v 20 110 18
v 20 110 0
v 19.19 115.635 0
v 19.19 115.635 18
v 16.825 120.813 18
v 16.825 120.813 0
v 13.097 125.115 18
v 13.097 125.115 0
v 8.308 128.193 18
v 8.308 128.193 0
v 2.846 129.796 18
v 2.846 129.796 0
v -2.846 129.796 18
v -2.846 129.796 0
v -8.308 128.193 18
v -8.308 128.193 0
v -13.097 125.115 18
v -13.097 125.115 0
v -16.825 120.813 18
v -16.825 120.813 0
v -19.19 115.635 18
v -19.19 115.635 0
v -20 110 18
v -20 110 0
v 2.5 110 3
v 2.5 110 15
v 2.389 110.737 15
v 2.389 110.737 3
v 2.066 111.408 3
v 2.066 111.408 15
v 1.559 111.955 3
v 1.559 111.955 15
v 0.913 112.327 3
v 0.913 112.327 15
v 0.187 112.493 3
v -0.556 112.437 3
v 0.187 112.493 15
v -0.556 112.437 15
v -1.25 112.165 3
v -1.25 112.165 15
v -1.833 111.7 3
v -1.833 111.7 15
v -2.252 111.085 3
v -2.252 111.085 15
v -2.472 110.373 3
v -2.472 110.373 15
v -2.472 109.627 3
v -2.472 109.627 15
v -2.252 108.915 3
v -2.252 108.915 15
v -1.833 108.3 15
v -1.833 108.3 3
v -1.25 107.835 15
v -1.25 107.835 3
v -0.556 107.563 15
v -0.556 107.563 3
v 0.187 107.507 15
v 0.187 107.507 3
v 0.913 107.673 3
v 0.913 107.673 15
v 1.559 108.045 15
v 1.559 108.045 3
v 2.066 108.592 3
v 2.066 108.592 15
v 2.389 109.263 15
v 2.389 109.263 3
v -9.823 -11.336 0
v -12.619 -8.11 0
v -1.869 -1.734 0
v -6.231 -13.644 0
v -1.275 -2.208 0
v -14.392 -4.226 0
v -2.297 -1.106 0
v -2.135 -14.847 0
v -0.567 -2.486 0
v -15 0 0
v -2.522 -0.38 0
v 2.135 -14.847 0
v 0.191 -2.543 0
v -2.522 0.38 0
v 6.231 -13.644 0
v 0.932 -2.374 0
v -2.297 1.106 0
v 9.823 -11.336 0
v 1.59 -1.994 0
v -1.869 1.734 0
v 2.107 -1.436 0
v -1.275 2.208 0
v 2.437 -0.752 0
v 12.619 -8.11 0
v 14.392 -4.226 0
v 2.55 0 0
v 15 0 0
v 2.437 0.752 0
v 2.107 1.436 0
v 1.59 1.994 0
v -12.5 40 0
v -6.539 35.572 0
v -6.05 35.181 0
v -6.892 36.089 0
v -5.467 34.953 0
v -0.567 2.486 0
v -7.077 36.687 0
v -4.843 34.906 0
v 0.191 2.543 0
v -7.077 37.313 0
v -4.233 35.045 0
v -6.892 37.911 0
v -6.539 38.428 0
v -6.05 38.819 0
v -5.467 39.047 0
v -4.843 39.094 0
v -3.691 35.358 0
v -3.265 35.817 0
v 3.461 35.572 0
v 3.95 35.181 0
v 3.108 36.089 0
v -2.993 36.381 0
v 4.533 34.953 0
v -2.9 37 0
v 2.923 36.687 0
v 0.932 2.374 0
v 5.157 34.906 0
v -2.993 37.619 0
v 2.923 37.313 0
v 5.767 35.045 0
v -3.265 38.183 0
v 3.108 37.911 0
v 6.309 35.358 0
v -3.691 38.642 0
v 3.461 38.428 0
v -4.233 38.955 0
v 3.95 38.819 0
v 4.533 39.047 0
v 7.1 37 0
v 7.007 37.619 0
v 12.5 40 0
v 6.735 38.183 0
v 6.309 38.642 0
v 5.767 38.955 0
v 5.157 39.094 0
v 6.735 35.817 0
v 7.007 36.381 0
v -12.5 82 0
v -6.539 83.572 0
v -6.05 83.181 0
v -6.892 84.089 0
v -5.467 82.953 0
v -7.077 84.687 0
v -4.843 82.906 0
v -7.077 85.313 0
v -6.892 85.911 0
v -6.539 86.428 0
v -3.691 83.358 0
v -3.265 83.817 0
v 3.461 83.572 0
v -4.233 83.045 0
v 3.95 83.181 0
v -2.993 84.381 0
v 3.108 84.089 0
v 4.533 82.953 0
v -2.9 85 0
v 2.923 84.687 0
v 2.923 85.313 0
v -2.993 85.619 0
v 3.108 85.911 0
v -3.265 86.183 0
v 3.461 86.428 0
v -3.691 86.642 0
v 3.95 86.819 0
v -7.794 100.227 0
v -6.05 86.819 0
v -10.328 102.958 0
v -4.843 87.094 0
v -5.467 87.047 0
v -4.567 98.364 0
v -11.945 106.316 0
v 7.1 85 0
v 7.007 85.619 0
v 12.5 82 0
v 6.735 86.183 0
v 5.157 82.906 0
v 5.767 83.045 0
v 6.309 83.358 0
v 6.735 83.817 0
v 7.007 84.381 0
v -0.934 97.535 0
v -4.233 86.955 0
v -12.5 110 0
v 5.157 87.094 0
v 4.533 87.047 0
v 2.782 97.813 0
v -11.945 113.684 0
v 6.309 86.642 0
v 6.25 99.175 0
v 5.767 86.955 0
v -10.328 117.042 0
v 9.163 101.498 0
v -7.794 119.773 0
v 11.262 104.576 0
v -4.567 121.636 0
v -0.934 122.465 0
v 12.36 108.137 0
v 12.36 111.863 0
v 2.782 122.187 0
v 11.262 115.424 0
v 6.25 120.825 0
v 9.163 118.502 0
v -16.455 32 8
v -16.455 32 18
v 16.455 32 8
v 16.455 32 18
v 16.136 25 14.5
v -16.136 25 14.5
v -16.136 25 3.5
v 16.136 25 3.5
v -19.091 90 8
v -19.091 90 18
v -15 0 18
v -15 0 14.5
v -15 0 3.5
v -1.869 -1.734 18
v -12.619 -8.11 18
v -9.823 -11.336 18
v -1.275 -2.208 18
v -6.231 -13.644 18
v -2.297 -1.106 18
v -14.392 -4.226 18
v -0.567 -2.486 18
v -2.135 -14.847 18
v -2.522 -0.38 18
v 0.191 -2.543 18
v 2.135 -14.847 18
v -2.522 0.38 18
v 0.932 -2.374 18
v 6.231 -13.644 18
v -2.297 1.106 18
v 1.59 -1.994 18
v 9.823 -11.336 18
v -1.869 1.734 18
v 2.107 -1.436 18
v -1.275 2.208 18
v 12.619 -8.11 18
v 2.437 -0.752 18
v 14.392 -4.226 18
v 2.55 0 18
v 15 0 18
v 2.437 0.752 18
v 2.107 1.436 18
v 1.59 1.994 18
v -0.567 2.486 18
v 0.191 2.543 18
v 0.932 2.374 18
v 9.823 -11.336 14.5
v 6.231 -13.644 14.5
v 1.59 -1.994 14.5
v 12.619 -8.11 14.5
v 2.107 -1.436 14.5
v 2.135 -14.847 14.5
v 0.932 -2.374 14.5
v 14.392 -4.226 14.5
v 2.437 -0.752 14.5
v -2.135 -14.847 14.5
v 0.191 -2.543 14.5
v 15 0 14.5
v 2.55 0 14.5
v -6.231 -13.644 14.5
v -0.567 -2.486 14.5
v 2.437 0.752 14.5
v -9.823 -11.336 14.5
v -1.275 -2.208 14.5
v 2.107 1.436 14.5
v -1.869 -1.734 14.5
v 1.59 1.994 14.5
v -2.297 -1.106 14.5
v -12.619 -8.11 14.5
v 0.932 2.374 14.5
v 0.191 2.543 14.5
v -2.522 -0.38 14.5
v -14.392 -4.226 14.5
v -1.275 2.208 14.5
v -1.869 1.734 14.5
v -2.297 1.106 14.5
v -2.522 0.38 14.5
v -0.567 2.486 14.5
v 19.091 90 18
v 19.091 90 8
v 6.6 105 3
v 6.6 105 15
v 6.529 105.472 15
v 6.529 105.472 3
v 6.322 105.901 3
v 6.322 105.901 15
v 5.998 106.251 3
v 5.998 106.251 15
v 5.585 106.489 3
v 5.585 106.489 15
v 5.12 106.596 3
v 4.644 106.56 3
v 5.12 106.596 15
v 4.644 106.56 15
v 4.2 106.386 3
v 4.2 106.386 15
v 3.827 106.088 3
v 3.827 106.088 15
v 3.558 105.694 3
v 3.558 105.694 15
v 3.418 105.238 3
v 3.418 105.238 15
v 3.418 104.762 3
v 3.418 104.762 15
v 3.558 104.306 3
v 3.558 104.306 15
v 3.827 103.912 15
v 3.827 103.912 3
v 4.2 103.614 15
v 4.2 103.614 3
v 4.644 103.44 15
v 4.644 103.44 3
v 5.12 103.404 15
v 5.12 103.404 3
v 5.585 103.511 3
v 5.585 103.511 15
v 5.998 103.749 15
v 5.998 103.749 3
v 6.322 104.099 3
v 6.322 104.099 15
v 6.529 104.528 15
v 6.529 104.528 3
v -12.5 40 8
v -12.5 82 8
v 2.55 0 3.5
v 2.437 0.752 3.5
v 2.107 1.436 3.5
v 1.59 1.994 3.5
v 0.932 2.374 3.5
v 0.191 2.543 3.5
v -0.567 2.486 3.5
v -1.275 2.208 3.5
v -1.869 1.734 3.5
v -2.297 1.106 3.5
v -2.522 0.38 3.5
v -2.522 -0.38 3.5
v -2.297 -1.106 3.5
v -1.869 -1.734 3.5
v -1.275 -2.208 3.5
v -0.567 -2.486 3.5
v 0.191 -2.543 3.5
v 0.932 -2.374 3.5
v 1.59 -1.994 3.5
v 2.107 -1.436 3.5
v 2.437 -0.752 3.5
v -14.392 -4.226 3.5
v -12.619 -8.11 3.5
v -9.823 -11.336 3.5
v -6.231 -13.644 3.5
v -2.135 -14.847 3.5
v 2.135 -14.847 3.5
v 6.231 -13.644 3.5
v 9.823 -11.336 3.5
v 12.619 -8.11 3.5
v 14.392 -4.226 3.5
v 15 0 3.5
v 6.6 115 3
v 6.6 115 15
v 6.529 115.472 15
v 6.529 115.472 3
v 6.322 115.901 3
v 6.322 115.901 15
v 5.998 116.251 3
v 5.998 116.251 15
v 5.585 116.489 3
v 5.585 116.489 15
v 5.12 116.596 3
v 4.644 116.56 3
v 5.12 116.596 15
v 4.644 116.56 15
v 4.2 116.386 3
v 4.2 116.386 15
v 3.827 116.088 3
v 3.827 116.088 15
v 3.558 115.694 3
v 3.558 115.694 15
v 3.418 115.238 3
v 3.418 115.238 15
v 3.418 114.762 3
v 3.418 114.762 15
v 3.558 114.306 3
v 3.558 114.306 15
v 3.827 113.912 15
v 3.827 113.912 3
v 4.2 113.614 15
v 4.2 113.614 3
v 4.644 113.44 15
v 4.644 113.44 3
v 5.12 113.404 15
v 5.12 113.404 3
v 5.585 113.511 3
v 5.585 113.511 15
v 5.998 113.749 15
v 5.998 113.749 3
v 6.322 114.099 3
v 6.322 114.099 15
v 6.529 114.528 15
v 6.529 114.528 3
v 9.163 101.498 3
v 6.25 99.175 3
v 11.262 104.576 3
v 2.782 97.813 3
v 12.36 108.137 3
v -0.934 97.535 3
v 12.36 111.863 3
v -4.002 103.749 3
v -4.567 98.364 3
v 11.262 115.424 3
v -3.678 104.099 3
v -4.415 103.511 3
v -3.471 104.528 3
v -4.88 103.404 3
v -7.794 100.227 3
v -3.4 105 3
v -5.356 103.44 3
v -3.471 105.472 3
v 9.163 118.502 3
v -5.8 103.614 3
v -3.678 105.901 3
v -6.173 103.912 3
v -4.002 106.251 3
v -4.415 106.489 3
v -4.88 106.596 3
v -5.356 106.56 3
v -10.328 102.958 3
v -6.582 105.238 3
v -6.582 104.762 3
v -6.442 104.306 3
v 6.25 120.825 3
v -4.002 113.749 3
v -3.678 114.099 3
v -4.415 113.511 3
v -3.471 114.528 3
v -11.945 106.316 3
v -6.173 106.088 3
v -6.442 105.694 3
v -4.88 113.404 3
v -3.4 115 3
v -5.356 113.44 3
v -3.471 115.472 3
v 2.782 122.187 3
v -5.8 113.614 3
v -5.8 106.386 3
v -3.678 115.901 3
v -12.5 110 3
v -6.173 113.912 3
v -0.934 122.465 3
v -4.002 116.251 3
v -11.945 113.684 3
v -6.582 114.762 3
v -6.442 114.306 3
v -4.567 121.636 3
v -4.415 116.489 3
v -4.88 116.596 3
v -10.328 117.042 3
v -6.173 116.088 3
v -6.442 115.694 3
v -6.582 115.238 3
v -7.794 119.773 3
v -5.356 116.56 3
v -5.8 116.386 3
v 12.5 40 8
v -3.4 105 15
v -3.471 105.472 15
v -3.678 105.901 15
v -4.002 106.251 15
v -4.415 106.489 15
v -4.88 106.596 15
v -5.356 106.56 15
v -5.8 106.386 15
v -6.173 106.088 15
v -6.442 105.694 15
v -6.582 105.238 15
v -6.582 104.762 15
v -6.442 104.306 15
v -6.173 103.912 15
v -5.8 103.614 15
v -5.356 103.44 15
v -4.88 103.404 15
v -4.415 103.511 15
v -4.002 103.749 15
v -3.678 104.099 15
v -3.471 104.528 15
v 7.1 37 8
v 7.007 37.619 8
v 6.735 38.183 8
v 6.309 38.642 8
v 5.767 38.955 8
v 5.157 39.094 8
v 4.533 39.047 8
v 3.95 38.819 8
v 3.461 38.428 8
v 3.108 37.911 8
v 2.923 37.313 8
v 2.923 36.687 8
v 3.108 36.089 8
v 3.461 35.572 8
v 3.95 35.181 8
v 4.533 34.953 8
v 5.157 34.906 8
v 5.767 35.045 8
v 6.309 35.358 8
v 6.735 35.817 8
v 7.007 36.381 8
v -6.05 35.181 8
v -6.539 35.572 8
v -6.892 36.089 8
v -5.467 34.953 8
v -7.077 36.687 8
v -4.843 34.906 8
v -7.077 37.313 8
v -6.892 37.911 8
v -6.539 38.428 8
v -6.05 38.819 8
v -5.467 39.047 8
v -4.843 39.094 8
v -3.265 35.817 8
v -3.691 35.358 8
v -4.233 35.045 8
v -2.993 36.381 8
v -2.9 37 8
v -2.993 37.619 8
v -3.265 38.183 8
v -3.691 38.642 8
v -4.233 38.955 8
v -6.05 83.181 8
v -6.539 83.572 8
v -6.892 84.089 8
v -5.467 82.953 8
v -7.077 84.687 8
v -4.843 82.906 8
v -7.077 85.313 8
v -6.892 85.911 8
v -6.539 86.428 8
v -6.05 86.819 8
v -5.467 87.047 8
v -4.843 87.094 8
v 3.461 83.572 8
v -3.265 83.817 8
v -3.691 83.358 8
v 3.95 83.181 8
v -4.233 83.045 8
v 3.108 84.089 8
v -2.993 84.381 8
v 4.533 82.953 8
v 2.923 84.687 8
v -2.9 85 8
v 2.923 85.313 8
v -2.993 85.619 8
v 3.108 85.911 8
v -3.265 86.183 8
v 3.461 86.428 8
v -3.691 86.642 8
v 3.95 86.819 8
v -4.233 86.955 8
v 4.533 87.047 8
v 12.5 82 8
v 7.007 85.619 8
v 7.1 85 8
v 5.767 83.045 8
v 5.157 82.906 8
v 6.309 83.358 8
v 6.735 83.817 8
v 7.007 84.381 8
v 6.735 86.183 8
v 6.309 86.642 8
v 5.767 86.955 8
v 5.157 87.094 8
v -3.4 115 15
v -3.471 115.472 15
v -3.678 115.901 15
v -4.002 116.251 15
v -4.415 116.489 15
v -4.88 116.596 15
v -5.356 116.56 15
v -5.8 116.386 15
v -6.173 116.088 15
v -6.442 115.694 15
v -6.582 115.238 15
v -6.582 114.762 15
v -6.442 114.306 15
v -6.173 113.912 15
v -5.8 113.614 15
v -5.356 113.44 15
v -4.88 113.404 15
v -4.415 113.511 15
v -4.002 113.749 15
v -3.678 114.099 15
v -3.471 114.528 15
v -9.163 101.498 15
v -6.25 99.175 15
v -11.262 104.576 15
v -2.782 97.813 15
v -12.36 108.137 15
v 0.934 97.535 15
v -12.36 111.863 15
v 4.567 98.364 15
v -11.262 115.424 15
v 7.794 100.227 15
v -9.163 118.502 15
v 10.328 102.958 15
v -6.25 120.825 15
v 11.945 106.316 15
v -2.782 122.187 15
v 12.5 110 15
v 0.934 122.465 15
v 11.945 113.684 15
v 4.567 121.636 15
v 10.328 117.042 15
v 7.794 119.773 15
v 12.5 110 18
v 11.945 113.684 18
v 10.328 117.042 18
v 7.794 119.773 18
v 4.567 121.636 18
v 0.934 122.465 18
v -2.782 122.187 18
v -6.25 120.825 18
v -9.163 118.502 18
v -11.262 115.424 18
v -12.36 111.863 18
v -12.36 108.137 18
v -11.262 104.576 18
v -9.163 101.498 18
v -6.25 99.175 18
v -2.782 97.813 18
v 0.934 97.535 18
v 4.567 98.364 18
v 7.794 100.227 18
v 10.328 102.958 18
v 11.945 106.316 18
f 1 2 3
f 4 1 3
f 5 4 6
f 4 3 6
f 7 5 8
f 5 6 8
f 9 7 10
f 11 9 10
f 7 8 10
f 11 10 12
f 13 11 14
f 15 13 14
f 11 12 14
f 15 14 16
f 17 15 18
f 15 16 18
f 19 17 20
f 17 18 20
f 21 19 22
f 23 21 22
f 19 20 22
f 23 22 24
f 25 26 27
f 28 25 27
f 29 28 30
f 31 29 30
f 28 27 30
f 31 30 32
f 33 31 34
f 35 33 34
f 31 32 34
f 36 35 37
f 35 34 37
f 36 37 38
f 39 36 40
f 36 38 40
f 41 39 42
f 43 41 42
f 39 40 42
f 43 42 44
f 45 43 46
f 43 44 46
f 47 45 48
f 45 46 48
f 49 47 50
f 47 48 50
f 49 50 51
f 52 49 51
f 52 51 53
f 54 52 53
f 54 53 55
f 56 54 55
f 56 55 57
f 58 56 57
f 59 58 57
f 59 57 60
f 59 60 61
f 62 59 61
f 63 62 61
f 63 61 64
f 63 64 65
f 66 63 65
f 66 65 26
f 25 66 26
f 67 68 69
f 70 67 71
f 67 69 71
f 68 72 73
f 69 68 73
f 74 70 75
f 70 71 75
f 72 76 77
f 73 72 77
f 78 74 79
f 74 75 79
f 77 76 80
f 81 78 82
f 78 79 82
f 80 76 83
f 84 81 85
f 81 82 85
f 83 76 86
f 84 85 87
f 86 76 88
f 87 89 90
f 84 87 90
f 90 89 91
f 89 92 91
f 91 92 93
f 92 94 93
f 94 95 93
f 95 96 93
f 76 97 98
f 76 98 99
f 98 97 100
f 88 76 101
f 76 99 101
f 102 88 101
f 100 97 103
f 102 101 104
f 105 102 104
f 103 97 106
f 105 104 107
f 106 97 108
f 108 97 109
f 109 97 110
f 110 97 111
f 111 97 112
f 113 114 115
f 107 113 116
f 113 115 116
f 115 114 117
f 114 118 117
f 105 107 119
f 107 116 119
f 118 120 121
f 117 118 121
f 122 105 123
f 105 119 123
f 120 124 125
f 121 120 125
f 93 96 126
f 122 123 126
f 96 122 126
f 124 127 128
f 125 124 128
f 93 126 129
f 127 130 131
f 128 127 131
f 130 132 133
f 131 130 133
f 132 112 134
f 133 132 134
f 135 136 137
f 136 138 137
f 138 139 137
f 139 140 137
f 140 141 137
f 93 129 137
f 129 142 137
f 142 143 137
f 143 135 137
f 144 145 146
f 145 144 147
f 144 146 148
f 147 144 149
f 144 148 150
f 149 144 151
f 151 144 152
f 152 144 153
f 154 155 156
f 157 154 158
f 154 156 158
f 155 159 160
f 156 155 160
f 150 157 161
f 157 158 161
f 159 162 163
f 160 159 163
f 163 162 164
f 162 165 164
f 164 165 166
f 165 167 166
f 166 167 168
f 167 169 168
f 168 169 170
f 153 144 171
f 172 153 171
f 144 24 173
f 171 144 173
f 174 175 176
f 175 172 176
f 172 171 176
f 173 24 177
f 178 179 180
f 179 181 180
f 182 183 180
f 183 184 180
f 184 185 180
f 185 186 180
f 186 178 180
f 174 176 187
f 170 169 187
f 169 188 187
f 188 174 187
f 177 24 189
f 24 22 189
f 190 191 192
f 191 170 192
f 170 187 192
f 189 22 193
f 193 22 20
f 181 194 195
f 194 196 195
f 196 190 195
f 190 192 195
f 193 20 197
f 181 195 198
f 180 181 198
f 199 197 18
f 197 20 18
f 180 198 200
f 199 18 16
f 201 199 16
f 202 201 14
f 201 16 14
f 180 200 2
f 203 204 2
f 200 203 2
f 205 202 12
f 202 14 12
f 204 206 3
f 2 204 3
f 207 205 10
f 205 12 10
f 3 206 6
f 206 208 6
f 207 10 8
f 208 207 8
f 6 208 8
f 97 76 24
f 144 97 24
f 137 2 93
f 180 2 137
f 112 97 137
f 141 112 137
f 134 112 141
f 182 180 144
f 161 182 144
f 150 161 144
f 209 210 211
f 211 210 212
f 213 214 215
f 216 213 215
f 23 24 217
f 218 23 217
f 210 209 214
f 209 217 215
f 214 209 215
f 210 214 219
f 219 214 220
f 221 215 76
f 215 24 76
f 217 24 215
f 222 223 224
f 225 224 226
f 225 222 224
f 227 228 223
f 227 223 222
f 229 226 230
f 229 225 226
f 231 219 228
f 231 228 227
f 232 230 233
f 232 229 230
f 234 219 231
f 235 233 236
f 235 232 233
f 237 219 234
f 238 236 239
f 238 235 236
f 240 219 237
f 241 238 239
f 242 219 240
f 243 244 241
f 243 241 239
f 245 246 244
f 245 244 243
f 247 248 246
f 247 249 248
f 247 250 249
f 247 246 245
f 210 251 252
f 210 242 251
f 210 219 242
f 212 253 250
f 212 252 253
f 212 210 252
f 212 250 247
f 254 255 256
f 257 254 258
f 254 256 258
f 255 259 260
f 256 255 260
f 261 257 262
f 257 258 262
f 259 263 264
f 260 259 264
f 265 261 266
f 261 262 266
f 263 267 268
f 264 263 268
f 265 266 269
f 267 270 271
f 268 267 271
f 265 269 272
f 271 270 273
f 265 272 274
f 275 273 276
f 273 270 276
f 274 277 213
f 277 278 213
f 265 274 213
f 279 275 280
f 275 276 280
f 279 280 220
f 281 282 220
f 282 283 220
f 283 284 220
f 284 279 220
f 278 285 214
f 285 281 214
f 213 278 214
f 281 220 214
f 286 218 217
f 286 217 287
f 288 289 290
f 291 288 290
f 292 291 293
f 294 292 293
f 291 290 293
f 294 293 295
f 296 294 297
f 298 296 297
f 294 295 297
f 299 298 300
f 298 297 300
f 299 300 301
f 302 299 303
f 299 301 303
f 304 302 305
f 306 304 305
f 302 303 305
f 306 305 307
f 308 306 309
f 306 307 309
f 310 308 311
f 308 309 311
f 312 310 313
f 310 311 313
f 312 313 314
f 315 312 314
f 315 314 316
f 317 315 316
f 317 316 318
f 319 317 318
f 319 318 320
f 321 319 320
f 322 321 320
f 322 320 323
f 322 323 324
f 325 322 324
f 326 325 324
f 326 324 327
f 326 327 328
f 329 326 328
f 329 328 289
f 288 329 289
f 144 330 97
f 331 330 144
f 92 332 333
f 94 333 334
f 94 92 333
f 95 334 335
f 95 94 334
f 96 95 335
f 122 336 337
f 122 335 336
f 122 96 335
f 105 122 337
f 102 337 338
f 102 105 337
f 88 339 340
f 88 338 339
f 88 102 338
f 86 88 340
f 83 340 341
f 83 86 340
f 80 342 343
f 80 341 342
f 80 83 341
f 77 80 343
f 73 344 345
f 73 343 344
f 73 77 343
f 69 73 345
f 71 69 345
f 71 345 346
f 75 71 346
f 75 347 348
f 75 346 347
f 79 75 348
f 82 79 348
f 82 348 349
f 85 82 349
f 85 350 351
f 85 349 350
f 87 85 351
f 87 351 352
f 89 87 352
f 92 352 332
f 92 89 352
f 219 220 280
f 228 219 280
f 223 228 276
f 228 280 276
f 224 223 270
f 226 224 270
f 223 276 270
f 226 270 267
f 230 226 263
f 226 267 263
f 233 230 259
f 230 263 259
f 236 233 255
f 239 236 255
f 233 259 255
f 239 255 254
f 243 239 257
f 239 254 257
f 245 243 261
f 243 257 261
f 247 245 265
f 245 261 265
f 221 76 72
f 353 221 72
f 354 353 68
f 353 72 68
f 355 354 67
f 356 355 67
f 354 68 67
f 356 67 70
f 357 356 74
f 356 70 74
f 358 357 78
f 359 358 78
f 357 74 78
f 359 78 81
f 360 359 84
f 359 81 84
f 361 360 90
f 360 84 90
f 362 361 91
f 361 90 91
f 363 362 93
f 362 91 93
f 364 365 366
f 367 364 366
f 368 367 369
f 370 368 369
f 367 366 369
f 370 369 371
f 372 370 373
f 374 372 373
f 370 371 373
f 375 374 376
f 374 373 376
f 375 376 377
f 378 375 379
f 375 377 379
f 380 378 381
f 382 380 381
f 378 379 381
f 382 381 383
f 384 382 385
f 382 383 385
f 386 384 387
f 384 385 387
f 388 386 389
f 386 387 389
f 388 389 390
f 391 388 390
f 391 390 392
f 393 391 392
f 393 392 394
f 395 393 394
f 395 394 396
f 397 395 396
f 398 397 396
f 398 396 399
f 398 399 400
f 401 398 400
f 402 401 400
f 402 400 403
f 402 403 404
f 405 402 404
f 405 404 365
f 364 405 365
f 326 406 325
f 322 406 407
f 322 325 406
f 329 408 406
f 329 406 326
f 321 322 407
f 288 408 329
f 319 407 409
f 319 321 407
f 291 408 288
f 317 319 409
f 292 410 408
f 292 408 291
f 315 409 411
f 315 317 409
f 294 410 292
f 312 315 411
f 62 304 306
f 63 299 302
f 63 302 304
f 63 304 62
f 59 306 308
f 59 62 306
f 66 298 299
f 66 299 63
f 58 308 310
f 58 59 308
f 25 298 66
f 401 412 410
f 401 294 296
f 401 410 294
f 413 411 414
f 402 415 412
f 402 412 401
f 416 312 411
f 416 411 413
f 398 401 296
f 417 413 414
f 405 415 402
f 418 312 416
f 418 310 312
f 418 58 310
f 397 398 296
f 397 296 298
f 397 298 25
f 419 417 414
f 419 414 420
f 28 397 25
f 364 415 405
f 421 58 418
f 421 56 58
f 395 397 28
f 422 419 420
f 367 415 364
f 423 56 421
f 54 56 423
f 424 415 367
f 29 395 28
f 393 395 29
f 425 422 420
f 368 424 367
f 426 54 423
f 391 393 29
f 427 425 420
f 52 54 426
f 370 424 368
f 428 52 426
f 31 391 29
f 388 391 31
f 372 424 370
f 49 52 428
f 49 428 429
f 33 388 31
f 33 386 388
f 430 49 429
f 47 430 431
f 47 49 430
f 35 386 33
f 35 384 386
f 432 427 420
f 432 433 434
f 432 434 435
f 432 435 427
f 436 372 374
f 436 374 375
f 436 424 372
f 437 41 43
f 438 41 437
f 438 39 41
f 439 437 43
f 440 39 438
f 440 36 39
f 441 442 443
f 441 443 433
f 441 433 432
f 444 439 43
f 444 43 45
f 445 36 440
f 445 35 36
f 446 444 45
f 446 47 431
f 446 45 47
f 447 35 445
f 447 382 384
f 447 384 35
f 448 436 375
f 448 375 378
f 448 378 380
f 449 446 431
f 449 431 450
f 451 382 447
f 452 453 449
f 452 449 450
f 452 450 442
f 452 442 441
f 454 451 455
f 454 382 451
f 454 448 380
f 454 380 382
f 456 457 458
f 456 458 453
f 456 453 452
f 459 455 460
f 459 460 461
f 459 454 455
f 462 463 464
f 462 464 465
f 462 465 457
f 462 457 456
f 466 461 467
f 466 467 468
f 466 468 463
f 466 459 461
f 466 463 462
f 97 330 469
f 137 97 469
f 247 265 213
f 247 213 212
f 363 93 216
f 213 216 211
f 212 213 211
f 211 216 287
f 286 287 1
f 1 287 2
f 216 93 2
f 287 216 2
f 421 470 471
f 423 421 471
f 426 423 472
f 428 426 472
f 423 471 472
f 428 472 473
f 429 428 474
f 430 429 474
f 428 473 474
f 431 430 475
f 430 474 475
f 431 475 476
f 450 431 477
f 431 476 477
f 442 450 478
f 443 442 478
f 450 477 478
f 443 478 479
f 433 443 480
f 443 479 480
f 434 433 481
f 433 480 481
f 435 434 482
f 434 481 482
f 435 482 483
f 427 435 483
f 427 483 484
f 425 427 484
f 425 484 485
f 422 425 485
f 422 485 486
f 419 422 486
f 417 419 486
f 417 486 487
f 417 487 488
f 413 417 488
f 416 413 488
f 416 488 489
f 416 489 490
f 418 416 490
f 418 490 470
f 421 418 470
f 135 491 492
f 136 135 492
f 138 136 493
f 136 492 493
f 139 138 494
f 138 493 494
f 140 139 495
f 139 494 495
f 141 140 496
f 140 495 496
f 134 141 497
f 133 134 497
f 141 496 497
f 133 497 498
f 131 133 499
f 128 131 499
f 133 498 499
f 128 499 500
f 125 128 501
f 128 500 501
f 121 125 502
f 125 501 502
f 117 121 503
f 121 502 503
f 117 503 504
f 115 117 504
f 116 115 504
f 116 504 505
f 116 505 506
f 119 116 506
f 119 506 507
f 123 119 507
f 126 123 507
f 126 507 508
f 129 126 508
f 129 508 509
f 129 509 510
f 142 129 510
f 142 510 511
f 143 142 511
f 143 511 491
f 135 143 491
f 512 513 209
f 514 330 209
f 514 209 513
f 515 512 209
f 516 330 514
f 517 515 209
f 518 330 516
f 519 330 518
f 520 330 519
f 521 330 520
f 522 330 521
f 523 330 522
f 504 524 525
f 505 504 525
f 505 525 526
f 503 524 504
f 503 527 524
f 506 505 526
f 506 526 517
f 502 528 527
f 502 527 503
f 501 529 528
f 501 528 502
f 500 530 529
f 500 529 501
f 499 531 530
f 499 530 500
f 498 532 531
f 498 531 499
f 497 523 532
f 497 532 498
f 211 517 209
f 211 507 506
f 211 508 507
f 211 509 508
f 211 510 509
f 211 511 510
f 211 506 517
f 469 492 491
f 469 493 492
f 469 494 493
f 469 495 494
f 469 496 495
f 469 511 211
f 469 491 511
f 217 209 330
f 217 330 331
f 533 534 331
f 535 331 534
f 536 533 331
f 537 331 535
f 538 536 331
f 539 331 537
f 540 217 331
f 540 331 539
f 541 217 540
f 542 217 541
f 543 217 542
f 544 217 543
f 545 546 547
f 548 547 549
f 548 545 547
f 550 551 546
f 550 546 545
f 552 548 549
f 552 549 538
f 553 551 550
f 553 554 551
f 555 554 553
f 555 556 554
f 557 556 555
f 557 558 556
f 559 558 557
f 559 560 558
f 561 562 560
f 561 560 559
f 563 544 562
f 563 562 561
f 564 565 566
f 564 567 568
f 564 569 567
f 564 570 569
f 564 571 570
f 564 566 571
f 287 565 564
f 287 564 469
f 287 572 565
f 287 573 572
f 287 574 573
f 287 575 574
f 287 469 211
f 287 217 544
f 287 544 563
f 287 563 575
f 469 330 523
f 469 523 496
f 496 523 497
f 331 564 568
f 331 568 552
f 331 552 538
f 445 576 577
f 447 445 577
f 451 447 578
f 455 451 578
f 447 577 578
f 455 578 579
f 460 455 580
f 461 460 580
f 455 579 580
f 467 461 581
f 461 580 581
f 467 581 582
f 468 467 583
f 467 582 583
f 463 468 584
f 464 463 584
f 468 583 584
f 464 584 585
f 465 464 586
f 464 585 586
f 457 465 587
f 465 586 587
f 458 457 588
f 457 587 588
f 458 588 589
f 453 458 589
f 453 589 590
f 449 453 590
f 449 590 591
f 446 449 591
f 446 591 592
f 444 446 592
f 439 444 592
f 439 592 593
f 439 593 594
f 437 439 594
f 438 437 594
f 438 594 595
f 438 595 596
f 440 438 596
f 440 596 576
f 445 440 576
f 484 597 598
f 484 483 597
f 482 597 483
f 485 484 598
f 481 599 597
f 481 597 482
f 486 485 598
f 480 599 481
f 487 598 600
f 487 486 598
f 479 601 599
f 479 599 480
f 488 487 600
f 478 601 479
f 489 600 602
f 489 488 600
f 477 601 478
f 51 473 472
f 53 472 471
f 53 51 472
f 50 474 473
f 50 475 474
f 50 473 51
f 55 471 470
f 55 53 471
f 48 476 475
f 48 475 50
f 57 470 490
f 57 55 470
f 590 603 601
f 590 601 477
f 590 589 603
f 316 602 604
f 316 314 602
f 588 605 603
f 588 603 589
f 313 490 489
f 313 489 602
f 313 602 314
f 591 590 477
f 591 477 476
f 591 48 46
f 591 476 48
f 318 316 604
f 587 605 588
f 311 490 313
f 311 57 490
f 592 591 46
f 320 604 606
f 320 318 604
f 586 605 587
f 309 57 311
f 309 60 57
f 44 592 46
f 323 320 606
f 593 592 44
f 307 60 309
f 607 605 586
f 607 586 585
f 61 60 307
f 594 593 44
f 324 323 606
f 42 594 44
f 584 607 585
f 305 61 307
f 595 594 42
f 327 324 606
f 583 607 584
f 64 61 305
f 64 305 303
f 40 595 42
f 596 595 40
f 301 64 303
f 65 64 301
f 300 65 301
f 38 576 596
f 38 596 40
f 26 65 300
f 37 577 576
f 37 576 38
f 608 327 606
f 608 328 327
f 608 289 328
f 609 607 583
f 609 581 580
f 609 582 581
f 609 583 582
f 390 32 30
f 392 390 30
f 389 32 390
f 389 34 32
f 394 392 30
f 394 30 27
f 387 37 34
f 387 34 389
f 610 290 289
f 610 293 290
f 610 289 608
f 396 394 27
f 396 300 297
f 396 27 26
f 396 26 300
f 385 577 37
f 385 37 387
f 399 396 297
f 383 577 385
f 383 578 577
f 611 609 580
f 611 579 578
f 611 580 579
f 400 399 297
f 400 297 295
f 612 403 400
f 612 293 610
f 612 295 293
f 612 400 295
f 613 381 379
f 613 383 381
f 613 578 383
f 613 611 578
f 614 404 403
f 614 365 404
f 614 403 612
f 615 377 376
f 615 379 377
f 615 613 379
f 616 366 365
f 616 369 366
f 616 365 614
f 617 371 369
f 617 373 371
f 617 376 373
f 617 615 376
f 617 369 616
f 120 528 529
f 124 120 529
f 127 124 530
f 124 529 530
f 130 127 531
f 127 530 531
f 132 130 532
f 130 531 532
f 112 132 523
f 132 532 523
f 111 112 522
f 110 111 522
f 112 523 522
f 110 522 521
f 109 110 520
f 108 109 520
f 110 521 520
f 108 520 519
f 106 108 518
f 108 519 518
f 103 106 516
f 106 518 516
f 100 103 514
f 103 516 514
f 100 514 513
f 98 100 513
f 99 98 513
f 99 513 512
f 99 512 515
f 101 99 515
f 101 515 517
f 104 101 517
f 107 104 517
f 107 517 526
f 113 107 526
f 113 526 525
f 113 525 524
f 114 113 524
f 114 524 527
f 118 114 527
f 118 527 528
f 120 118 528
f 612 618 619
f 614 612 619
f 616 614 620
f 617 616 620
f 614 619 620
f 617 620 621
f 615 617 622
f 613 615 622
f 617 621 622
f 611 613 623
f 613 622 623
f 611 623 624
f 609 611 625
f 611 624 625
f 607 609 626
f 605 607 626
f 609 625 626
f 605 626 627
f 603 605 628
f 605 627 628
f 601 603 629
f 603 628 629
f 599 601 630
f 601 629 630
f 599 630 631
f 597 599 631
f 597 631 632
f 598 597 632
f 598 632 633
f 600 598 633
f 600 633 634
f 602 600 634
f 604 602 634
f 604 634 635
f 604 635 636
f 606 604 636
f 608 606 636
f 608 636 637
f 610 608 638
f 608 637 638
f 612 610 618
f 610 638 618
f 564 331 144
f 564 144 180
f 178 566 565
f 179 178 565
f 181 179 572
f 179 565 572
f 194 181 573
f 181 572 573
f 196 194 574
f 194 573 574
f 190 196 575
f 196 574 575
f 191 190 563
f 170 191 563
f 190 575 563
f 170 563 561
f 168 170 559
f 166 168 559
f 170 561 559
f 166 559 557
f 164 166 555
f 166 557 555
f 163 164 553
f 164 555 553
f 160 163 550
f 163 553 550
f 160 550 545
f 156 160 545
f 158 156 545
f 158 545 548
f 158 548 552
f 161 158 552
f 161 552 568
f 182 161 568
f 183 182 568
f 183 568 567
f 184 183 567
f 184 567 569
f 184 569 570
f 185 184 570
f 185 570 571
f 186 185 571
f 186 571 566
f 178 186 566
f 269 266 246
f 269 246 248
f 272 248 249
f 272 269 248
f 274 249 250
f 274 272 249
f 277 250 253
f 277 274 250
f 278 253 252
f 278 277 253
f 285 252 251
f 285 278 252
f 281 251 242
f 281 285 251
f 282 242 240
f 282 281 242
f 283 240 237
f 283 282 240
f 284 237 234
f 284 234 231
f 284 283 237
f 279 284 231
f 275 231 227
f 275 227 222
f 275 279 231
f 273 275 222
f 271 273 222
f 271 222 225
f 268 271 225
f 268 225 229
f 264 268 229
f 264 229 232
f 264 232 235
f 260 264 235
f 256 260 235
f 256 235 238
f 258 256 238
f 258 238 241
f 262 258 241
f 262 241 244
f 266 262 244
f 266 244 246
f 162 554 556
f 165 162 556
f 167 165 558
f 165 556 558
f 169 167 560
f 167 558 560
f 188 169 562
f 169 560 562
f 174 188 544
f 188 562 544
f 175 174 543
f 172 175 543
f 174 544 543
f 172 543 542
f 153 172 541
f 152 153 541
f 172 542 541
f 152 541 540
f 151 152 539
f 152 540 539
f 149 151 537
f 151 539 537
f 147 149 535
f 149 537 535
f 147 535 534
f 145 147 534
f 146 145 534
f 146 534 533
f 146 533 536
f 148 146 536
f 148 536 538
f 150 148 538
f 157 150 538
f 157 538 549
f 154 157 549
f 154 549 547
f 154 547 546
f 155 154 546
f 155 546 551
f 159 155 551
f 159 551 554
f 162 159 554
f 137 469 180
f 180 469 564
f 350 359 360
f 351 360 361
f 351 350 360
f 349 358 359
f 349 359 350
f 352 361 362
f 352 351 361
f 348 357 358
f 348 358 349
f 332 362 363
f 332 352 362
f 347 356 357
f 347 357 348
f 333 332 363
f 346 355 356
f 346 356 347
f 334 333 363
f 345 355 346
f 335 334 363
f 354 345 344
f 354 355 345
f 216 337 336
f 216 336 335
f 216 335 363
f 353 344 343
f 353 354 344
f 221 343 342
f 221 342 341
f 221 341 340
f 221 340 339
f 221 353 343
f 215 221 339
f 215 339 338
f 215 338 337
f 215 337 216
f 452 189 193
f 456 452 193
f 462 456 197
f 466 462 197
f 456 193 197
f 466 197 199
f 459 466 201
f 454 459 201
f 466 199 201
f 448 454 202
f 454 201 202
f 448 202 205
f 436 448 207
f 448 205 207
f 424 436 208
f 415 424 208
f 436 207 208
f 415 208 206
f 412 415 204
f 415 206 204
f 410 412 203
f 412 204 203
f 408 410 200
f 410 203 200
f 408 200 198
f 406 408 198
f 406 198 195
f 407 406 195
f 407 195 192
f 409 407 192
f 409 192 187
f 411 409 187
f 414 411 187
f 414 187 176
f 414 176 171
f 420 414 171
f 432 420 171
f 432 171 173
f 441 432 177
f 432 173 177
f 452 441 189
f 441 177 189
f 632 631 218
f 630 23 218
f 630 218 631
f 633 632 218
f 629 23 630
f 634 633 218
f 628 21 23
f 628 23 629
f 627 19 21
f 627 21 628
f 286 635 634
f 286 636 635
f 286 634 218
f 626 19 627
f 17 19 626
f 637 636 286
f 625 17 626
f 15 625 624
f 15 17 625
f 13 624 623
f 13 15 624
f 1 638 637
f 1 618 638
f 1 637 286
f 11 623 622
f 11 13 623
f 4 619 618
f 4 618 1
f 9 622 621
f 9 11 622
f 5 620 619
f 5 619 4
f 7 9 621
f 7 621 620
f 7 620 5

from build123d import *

# Parameters (mm, degrees)
SKETCH1_R               = 2.55
BOSS_EXTRUDE1_DEPTH     = 18
SKETCH2_R               = 12.5
CUT_EXTRUDE1_DEPTH      = 3
SKETCH3_R               = 12.5
CUT_EXTRUDE2_DEPTH      = 3
SKETCH4_R               = 2.5
SKETCH4_R_2             = 1.6
CUT_EXTRUDE3_DEPTH      = 16
SKETCH5_W               = 11
SKETCH5_H               = 40
CUT_EXTRUDE4_DEPTH      = 21
CUT_EXTRUDE4_DEPTH_BACK = 21
SKETCH7_W               = 40
SKETCH7_H               = 58
CUT_EXTRUDE5_DEPTH      = 10
SKETCH8_R               = 2.1
SKETCH8_W               = 25
SKETCH8_H               = 42
CUT_EXTRUDE6_DEPTH      = 9


with BuildPart() as part:
    # Sketch1 → Boss-Extrude1 (new body)
    with BuildSketch(Plane.XY):
        with BuildLine():
            ThreePointArc((20, 110), (0, 130), (-20, 110))
            Line((-20, 110), (-15, 0))
            ThreePointArc((-15, 0), (0, -15), (15, 0))
            Line((15, 0), (20, 110))
        make_face()
        Circle(SKETCH1_R, mode=Mode.SUBTRACT)
    extrude(amount=BOSS_EXTRUDE1_DEPTH)

    # Sketch2 → Cut-Extrude1 (cut)
    with BuildSketch(Plane.XY.offset(18)):
        with Locations((0, 110)):
            Circle(SKETCH2_R)
    extrude(amount=-CUT_EXTRUDE1_DEPTH, mode=Mode.SUBTRACT)

    # Sketch3 → Cut-Extrude2 (cut)
    with BuildSketch(Plane(origin=(0, 0, 0), x_dir=(-1, 0, 0), z_dir=(0, 0, -1))):
        with Locations((0, 110)):
            Circle(SKETCH3_R)
    extrude(amount=-CUT_EXTRUDE2_DEPTH, mode=Mode.SUBTRACT)

    # Sketch4 → Cut-Extrude3 (cut, through all)
    with BuildSketch(Plane.XY.offset(15)):
        with Locations((0, 110)):
            Circle(SKETCH4_R)
        with Locations((-5, 115)):
            Circle(SKETCH4_R_2)
        with Locations((-5, 105)):
            Circle(SKETCH4_R_2)
        with Locations((5, 105)):
            Circle(SKETCH4_R_2)
        with Locations((5, 115)):
            Circle(SKETCH4_R_2)
    extrude(amount=-CUT_EXTRUDE3_DEPTH, mode=Mode.SUBTRACT)

    # Sketch5 → Cut-Extrude4 (cut, two sides)
    with BuildSketch(Plane(origin=(0, 0, 0), x_dir=(0, 0, -1), z_dir=(1, 0, 0))) as cut_extrude4_sk:
        with Locations((-9, 5)):
            Rectangle(SKETCH5_W, SKETCH5_H)
    extrude(amount=CUT_EXTRUDE4_DEPTH, mode=Mode.SUBTRACT)
    extrude(cut_extrude4_sk.sketch, amount=-CUT_EXTRUDE4_DEPTH_BACK, mode=Mode.SUBTRACT)

    # Sketch7 → Cut-Extrude5 (cut)
    with BuildSketch(Plane.XY.offset(18)):
        with Locations((0, 61)):
            Rectangle(SKETCH7_W, SKETCH7_H)
    extrude(amount=-CUT_EXTRUDE5_DEPTH, mode=Mode.SUBTRACT)

    # Sketch8 → Cut-Extrude6 (cut, through all)
    with BuildSketch(Plane.XY.offset(8)):
        with Locations((-5, 85)):
            Circle(SKETCH8_R)
        with Locations((5, 85)):
            Circle(SKETCH8_R)
        with Locations((5, 37)):
            Circle(SKETCH8_R)
        with Locations((-5, 37)):
            Circle(SKETCH8_R)
        with Locations((0, 61)):
            Rectangle(SKETCH8_W, SKETCH8_H)
    extrude(amount=-CUT_EXTRUDE6_DEPTH, mode=Mode.SUBTRACT)


solid = part.part
